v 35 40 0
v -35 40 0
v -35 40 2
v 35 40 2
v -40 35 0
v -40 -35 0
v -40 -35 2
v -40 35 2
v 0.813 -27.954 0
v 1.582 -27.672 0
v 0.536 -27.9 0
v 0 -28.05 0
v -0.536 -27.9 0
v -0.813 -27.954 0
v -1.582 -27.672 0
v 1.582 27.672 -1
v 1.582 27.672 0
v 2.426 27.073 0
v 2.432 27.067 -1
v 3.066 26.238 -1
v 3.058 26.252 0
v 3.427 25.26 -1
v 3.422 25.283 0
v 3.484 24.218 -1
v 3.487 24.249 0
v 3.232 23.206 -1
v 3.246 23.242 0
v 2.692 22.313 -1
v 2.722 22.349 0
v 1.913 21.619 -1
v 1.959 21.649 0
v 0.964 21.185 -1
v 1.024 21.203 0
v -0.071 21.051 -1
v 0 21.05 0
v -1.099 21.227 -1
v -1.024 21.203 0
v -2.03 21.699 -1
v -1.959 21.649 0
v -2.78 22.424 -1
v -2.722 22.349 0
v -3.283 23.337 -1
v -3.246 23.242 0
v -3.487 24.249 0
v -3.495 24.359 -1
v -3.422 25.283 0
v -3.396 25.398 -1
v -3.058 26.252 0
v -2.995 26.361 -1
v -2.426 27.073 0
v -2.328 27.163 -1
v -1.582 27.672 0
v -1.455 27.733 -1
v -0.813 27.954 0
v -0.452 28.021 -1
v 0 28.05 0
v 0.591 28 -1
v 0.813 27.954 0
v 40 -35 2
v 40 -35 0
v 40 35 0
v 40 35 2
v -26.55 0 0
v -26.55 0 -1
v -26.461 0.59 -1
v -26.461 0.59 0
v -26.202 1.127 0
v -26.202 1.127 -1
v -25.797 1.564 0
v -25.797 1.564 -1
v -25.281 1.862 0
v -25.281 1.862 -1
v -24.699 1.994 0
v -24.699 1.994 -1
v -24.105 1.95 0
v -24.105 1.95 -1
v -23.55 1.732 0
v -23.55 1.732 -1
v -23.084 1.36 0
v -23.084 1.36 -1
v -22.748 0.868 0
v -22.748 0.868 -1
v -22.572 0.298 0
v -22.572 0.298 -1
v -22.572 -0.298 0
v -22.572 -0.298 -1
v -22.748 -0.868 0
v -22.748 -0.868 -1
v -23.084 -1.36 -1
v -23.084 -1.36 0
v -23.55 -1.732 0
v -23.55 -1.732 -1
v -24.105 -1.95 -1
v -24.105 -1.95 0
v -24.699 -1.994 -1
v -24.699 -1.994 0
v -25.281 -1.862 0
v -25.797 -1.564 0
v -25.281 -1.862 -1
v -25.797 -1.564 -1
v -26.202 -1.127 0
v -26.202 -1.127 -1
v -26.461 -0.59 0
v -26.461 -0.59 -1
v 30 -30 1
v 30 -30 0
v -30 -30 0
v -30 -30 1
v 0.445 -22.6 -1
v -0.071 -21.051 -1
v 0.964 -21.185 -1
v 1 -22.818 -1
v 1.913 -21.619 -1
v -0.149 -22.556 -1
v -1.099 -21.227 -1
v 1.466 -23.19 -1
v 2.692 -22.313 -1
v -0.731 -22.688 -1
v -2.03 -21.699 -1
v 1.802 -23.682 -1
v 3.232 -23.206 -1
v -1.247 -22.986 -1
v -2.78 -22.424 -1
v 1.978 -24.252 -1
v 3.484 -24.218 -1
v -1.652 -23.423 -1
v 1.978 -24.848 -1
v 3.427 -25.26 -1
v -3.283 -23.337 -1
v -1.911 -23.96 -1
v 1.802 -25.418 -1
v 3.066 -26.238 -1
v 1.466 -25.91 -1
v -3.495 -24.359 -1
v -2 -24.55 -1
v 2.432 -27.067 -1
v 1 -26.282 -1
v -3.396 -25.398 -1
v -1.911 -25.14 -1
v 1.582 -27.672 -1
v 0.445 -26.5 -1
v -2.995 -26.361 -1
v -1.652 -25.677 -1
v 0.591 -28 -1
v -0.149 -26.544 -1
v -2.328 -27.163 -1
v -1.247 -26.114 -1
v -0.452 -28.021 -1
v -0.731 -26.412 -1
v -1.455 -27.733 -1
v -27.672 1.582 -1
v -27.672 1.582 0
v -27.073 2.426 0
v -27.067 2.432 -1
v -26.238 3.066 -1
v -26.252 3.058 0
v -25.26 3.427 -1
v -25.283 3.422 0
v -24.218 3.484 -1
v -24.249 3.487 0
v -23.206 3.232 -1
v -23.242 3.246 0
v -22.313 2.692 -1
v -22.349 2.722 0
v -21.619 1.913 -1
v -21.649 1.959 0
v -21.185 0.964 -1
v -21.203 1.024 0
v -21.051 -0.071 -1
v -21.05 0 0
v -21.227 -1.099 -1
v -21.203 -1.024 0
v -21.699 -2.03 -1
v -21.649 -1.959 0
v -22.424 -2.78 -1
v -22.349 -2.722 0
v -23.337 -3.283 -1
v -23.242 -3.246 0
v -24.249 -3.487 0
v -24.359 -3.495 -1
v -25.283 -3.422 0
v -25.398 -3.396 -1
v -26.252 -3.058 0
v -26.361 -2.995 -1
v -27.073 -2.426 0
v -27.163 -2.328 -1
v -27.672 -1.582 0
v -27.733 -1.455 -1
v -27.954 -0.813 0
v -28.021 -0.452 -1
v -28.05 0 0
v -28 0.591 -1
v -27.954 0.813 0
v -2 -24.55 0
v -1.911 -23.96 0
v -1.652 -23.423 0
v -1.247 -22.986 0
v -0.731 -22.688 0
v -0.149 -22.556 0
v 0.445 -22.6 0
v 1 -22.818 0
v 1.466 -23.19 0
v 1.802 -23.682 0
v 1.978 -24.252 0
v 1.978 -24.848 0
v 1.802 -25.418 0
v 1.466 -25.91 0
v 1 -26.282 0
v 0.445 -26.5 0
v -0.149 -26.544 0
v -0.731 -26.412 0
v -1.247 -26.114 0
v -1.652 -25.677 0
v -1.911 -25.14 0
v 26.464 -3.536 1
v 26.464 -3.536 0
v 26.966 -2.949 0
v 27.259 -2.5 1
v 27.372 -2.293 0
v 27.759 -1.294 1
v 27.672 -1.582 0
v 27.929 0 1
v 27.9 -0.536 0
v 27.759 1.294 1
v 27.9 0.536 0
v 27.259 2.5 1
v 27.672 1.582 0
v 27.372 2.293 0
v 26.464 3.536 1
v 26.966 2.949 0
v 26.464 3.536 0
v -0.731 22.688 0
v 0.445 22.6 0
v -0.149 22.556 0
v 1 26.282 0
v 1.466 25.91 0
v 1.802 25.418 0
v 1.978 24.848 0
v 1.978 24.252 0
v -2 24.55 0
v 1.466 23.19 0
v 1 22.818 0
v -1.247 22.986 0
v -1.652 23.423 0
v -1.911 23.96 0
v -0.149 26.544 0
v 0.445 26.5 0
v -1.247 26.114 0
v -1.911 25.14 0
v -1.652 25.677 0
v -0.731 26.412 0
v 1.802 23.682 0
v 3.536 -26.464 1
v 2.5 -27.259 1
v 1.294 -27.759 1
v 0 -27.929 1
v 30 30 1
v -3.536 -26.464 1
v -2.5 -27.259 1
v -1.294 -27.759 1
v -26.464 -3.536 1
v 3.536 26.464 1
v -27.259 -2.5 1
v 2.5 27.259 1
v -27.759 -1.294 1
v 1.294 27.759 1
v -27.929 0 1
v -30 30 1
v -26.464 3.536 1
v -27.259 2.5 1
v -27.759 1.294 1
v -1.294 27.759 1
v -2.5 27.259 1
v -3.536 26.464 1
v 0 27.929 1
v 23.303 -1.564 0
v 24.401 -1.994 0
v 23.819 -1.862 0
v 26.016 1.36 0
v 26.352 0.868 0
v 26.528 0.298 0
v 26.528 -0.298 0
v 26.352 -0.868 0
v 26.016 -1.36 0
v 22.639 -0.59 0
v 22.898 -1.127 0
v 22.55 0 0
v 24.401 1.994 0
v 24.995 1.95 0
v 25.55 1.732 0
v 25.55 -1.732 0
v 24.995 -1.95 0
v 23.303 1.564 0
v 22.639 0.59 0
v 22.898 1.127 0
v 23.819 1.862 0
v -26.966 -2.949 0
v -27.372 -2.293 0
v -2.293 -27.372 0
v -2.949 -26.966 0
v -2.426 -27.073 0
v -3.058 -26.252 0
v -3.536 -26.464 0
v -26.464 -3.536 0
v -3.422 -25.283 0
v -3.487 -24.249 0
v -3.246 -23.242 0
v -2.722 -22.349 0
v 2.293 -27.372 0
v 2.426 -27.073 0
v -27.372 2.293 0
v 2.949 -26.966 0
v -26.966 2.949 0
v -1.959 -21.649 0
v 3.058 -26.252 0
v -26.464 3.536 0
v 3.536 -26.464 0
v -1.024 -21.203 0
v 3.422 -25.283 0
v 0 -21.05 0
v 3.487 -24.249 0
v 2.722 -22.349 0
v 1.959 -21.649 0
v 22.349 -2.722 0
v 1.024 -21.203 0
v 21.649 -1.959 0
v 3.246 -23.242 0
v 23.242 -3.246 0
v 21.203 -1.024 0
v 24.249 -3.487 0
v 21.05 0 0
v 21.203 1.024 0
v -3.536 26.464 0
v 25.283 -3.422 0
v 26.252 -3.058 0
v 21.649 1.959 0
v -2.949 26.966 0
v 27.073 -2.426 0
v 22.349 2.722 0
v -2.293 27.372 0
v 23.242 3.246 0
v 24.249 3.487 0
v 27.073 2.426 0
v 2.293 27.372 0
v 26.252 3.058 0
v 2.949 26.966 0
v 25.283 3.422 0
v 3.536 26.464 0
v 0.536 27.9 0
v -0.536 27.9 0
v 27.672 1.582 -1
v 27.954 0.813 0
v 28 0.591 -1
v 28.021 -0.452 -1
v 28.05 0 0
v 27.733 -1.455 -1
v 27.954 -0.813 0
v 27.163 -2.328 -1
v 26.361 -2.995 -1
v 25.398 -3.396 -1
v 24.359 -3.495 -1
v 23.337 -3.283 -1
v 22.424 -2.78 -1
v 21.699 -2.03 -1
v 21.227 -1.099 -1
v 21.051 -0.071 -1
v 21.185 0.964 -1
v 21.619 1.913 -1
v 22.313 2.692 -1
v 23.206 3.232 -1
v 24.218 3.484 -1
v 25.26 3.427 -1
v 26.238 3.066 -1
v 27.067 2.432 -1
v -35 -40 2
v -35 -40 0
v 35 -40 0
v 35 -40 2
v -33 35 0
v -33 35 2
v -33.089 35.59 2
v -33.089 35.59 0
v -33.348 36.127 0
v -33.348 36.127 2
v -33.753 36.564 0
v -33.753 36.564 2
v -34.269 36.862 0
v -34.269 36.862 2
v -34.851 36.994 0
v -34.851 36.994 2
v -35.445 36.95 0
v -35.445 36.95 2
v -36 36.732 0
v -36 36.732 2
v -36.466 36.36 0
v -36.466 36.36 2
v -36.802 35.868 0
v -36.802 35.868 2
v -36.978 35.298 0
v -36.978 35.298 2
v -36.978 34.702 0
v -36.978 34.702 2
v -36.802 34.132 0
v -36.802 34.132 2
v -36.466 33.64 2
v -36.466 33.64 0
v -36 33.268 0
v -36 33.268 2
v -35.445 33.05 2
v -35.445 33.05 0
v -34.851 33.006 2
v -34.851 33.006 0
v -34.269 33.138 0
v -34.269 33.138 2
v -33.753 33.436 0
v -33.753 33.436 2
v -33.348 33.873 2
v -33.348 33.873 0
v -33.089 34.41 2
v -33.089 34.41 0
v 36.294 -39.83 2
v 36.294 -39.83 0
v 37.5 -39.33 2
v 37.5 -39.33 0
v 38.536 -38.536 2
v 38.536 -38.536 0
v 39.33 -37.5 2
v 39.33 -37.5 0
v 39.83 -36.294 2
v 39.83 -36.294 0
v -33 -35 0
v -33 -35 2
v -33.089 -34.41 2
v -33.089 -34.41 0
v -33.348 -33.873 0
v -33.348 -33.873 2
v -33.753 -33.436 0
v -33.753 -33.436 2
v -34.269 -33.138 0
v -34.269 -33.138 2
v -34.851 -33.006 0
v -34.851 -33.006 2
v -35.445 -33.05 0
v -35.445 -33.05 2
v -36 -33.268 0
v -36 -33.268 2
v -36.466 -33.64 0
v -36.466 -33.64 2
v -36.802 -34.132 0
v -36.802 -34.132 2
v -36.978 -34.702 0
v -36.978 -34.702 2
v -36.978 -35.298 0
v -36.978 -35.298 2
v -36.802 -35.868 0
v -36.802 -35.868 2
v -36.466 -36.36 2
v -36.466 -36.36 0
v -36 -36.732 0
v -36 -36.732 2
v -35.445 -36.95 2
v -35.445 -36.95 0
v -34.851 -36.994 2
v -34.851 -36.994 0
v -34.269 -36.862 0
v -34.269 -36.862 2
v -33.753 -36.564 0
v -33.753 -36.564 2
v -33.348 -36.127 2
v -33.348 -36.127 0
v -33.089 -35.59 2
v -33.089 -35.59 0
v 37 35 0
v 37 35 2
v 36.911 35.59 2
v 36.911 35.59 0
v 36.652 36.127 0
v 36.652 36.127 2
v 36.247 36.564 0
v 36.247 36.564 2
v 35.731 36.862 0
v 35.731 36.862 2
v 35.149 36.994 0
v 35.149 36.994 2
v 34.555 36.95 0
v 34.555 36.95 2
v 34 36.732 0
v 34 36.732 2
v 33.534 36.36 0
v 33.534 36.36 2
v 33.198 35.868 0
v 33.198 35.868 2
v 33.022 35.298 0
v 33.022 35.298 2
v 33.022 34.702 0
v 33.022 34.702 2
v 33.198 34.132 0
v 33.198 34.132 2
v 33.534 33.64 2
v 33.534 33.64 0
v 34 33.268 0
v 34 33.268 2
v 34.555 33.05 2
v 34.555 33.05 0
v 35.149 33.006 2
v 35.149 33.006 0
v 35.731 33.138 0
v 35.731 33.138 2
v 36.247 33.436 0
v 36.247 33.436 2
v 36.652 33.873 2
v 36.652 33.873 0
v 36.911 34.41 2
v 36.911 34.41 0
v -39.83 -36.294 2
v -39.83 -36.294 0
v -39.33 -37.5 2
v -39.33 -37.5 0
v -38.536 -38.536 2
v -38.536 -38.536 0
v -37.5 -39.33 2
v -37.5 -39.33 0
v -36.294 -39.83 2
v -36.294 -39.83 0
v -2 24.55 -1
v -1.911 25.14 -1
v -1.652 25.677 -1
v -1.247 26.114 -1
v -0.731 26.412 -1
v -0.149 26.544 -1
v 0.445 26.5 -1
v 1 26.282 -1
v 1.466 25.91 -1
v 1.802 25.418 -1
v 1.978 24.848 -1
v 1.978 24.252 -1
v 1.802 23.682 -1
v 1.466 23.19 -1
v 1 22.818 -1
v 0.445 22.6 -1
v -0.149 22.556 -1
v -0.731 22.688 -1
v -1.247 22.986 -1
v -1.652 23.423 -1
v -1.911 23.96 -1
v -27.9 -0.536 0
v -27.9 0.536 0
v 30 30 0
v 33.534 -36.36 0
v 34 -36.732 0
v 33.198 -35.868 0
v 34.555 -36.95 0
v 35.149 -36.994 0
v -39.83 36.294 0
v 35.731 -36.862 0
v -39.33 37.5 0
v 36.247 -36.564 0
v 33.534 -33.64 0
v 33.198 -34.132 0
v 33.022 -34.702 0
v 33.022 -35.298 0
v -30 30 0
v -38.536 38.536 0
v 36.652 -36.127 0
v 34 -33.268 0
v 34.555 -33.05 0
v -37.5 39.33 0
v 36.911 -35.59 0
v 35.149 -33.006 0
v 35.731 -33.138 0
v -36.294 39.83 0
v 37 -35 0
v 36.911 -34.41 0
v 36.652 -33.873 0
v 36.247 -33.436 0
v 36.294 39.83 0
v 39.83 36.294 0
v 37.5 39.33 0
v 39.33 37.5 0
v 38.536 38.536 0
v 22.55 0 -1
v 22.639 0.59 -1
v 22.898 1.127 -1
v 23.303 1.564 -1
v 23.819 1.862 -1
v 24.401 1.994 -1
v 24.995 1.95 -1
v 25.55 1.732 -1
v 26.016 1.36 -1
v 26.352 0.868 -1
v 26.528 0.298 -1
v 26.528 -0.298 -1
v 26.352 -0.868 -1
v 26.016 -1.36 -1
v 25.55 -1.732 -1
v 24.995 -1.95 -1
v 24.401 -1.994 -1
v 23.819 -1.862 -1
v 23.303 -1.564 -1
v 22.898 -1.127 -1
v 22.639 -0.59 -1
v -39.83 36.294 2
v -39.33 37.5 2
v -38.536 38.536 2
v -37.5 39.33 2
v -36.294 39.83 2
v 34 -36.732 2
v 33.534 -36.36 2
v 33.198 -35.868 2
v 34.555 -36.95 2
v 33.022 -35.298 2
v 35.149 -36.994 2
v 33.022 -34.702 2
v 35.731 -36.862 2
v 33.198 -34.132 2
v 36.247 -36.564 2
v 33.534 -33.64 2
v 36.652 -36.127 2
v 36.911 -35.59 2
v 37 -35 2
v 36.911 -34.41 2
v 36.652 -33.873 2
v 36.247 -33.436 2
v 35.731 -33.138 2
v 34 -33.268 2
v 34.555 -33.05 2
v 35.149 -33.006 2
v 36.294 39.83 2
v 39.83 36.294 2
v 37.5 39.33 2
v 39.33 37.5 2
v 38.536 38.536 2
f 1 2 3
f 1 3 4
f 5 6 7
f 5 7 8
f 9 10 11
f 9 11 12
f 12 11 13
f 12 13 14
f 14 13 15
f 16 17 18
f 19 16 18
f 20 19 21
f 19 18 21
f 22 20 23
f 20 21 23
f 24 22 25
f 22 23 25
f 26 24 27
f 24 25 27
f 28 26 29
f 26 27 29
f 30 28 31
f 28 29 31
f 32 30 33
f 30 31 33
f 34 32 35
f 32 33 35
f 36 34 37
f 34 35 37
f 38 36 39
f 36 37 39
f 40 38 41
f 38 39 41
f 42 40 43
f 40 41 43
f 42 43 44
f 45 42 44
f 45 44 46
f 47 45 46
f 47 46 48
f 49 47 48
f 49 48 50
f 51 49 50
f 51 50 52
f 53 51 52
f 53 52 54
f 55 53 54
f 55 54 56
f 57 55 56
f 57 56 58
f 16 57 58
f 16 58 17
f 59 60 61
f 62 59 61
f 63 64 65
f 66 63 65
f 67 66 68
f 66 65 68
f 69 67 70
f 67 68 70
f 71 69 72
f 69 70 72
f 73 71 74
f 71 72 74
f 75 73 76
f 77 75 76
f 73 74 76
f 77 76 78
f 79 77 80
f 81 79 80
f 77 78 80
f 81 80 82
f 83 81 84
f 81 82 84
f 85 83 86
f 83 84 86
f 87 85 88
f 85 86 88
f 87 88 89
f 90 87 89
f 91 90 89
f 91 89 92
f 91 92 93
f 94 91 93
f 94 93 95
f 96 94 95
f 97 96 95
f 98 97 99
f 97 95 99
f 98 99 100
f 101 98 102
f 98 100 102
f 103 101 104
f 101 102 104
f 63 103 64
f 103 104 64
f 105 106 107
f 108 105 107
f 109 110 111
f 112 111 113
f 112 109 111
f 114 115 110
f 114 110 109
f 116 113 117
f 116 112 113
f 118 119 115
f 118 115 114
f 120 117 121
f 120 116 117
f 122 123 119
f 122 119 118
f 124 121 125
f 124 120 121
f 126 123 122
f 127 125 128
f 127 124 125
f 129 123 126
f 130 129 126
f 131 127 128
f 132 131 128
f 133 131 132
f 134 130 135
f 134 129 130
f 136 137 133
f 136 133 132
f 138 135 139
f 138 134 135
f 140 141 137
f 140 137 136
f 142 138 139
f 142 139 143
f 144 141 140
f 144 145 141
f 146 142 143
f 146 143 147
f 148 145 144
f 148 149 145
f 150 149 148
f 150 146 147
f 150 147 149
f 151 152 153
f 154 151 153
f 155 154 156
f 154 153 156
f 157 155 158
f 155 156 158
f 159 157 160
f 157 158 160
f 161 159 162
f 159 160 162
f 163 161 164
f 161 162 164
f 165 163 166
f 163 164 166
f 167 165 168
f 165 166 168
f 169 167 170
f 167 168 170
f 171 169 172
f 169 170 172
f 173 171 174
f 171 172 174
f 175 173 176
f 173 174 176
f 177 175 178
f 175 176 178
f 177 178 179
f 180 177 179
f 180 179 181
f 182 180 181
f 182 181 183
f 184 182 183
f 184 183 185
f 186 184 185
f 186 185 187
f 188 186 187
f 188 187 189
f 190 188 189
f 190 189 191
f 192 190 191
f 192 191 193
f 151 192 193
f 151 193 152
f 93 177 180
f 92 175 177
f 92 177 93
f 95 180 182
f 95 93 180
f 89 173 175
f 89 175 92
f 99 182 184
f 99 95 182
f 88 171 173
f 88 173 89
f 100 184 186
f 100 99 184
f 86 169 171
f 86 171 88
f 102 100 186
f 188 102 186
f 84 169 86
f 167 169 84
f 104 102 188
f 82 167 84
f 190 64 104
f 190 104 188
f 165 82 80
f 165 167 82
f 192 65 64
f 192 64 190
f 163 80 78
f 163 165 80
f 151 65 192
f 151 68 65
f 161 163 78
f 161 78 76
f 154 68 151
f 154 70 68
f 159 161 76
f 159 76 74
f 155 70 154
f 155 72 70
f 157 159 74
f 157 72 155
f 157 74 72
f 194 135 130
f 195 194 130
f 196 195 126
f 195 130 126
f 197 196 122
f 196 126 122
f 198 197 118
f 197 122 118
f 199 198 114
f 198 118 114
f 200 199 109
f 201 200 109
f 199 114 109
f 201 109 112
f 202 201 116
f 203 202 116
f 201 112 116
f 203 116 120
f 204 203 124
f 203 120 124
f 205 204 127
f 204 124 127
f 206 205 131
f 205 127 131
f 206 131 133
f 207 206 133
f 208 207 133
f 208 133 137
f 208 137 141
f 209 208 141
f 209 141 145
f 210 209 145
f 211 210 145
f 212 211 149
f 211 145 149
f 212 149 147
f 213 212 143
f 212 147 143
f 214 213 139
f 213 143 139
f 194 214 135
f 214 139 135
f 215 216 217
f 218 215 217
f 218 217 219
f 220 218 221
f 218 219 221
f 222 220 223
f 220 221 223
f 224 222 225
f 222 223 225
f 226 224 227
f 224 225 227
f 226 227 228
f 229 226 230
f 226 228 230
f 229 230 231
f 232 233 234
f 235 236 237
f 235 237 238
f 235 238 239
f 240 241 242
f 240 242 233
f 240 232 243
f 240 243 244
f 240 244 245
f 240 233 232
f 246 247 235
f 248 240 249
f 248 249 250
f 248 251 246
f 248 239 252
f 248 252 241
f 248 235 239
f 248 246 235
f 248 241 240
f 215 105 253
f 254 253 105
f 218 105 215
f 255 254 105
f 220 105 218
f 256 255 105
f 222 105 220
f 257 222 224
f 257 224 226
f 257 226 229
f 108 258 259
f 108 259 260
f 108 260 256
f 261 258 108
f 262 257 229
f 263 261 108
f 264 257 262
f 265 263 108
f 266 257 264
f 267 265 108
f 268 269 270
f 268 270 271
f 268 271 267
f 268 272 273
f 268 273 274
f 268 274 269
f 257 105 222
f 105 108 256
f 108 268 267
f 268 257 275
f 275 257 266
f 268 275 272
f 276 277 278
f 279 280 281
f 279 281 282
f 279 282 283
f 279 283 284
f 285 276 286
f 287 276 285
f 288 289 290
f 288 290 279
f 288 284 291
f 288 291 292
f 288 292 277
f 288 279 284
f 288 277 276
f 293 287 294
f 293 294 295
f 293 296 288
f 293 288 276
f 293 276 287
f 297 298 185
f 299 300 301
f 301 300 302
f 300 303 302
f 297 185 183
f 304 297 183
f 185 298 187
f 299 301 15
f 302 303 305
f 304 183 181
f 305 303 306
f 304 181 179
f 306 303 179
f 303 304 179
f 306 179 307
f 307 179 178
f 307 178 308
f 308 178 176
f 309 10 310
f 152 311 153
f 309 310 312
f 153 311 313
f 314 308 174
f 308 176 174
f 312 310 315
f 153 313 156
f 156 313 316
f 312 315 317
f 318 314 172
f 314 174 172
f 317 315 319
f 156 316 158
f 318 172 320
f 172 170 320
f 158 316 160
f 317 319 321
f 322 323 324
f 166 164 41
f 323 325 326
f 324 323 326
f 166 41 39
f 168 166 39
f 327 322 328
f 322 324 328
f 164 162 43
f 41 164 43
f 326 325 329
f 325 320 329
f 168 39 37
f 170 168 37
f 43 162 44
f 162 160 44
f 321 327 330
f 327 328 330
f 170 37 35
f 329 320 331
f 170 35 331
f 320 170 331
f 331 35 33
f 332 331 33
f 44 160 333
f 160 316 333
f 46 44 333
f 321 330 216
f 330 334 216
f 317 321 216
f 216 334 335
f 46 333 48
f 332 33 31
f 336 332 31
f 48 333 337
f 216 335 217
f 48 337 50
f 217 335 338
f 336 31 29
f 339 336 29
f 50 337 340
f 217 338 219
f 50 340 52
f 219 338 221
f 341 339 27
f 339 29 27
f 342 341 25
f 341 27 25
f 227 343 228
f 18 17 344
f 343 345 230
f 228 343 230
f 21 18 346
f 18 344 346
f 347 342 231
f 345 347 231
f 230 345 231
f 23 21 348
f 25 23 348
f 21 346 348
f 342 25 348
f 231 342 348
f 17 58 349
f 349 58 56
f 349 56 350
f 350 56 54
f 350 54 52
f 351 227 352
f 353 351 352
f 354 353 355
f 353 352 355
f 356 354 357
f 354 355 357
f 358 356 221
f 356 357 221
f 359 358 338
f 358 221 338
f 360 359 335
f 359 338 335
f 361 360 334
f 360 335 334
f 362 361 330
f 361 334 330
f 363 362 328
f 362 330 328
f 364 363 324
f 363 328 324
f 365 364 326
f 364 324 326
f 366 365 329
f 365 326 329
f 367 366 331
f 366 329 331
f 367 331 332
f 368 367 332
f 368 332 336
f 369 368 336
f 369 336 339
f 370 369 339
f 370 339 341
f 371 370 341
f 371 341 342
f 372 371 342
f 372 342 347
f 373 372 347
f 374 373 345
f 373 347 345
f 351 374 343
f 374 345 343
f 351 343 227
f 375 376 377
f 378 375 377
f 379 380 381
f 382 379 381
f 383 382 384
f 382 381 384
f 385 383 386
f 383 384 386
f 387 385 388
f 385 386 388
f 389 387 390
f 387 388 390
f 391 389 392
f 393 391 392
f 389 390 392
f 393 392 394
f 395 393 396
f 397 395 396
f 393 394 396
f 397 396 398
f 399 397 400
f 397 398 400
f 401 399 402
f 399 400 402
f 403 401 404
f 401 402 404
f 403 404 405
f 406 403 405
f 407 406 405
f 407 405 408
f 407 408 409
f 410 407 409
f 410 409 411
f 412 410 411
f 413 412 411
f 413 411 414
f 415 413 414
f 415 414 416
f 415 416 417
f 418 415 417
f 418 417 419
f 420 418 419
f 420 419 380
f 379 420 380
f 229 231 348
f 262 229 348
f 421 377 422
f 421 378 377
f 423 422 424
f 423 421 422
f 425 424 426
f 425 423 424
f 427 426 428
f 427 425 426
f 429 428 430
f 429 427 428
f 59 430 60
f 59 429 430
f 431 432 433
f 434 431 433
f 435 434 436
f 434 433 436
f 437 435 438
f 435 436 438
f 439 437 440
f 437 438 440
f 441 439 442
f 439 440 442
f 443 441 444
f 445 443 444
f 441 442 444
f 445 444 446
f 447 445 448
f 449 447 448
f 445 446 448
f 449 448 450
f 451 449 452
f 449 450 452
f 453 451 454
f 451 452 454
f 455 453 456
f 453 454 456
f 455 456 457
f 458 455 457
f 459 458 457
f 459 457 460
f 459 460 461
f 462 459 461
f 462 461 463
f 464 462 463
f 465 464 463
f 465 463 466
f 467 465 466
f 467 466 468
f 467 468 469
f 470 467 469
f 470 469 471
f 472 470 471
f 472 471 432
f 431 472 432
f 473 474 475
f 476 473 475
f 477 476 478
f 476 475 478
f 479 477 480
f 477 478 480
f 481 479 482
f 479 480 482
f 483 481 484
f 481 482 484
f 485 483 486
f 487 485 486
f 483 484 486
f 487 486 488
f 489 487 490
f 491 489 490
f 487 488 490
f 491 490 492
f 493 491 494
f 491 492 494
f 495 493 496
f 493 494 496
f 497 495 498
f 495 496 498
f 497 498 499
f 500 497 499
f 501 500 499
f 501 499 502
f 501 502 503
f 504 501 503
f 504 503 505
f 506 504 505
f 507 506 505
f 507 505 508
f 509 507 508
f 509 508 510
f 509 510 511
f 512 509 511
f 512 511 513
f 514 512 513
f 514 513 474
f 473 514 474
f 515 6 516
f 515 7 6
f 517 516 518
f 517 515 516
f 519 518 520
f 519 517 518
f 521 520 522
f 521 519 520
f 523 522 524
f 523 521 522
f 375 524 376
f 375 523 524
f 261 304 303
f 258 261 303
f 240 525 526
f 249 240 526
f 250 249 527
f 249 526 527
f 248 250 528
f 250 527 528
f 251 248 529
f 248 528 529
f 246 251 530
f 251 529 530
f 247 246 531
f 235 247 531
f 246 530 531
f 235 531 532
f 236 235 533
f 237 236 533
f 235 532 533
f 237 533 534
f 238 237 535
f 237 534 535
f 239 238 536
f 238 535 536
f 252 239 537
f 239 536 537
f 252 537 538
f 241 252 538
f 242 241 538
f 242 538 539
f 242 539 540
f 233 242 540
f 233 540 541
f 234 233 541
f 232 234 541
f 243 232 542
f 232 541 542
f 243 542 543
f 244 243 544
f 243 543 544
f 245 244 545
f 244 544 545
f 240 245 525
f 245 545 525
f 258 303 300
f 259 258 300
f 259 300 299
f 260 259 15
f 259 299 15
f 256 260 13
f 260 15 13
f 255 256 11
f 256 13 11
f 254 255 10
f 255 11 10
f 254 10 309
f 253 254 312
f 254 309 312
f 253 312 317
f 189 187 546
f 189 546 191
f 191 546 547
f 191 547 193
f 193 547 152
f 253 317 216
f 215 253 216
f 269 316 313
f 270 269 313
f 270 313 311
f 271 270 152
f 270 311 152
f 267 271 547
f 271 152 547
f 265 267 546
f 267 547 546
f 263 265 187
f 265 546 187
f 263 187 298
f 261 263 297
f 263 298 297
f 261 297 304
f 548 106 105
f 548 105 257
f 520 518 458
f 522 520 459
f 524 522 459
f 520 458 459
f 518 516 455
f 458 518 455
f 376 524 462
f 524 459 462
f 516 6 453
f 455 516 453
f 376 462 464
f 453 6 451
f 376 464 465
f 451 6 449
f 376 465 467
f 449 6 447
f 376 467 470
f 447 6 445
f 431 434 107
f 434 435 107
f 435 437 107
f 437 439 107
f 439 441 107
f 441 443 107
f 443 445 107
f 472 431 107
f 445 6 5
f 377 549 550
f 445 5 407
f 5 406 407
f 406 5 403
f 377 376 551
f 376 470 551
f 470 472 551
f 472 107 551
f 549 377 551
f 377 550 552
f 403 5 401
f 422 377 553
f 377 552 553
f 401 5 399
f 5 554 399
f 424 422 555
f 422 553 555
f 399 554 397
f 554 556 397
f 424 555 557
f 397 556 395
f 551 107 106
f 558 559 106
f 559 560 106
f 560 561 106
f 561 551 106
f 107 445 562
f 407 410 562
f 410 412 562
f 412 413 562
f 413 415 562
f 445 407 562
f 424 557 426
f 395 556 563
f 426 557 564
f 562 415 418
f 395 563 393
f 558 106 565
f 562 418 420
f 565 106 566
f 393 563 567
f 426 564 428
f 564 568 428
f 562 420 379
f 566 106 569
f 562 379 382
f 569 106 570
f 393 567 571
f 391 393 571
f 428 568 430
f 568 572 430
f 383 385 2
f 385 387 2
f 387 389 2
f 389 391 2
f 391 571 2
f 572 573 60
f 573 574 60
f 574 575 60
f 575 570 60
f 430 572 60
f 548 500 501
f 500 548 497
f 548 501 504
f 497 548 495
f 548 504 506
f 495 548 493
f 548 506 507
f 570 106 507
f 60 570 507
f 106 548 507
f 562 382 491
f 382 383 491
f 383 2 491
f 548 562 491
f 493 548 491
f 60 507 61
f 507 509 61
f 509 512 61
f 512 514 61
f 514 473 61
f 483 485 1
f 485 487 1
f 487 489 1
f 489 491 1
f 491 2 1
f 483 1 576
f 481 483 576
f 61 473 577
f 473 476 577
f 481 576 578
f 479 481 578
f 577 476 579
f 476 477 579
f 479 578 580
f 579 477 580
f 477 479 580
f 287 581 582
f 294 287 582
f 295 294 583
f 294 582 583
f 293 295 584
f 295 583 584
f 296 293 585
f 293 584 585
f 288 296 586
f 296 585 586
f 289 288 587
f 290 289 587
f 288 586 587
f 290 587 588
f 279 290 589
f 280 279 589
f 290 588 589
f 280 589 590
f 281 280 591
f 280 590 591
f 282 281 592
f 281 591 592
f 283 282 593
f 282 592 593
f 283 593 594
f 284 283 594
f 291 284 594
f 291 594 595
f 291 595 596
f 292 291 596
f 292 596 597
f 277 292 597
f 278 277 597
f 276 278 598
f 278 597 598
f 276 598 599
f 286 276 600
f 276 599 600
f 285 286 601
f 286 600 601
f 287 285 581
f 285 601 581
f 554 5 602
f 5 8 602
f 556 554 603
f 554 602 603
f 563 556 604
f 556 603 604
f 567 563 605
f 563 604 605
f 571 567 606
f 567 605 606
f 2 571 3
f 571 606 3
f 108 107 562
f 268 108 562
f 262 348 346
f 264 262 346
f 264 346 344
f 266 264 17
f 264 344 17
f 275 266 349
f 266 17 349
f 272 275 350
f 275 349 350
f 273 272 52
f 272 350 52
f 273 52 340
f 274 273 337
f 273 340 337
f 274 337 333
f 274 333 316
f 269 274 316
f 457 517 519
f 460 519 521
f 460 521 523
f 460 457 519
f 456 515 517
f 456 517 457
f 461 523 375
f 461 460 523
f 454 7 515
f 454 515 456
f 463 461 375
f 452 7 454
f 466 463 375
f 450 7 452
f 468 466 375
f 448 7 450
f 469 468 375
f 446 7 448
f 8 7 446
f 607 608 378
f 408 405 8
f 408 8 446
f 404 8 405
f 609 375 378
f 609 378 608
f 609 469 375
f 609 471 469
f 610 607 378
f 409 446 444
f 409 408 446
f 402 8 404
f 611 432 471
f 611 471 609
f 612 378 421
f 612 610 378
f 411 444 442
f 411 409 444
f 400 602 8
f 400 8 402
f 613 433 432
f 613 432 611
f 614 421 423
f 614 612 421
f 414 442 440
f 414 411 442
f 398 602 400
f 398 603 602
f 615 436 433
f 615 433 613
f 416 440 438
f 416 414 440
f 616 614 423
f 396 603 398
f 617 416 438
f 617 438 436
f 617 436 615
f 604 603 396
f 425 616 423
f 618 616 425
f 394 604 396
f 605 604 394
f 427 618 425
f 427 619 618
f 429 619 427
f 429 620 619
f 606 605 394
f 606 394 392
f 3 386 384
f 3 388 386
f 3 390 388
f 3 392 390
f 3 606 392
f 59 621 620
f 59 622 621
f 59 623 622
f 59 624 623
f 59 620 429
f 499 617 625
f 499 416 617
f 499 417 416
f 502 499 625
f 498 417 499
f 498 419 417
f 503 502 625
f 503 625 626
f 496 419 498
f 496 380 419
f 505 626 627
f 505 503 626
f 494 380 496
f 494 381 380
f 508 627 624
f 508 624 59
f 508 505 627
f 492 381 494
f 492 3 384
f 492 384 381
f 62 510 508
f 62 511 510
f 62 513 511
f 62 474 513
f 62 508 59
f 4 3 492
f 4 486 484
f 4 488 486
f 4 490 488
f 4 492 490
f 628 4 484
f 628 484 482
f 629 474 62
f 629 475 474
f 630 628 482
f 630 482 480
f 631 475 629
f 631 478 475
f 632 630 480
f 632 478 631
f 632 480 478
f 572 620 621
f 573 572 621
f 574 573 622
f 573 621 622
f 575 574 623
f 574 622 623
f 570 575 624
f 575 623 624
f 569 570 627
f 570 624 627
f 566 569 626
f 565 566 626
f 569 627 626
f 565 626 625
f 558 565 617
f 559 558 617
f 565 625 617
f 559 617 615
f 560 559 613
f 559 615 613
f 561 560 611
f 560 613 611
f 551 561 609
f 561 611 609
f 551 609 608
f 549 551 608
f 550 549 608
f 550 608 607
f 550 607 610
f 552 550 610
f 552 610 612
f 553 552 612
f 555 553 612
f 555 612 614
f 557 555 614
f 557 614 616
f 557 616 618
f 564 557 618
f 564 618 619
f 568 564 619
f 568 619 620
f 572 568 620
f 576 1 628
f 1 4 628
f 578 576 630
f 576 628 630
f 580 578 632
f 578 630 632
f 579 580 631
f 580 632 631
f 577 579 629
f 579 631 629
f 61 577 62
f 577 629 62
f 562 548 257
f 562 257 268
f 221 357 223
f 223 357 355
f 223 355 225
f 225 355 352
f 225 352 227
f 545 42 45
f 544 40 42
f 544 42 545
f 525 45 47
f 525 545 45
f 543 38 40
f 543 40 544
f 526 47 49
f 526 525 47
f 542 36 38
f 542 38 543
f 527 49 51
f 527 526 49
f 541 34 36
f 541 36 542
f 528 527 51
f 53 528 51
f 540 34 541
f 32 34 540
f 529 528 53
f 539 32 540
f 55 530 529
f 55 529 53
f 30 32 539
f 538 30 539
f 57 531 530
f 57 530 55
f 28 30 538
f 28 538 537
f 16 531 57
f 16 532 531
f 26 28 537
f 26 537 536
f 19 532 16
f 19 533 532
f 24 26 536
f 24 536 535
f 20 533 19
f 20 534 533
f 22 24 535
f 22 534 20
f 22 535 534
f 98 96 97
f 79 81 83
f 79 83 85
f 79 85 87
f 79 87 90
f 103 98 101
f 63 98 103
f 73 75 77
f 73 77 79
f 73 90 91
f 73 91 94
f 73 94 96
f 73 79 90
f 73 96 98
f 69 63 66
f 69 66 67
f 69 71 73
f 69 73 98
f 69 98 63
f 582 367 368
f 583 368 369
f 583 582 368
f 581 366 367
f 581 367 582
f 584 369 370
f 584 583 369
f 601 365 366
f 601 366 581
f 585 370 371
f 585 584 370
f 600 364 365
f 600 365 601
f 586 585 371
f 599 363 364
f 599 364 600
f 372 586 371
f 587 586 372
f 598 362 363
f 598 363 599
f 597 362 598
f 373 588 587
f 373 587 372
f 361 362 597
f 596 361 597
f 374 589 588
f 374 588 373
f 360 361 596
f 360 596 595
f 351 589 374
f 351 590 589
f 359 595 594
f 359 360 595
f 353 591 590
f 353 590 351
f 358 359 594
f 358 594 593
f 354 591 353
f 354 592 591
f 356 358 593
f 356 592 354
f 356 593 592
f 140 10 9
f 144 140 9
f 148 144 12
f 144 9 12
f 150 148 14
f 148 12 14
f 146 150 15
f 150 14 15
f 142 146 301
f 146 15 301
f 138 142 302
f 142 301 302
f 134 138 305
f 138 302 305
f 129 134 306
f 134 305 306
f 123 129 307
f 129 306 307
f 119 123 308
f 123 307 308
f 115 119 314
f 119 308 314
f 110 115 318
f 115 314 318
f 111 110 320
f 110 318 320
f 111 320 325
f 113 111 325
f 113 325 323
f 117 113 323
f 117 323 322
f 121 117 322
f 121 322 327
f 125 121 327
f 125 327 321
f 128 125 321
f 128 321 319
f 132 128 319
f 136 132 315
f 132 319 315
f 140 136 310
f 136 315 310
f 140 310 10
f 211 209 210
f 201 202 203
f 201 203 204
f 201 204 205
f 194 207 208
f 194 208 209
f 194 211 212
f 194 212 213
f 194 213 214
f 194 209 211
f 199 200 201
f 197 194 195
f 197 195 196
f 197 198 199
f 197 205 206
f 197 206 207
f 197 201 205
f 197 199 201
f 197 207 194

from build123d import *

# Parameters (mm, degrees)
SKETCH1_W           = 80
SKETCH1_H           = 80
BOSS_EXTRUDE1_DEPTH = 2
SKETCH2_R           = 3.5
BOSS_EXTRUDE2_DEPTH = 1
SKETCH3_R           = 2
CUT_EXTRUDE1_DEPTH  = 1
FILLET1_R           = 5
SKETCH4_R           = 2
CUT_EXTRUDE2_DEPTH  = 11
SKETCH5_W           = 60
SKETCH5_H           = 60
CUT_EXTRUDE4_DEPTH  = 1


with BuildPart() as part:
    # Sketch1 → Boss-Extrude1 (new body)
    with BuildSketch(Plane.XY):
        Rectangle(SKETCH1_W, SKETCH1_H)
    extrude(amount=BOSS_EXTRUDE1_DEPTH)

    # Sketch2 → Boss-Extrude2 (add)
    with BuildSketch(Plane(origin=(0, 0, 0), x_dir=(-1, 0, 0), z_dir=(0, 0, -1))):
        with Locations(Location((0, 24.55, 0), (0, 0, 116.872206362))):
            Circle(SKETCH2_R)
        with Locations(Location((24.55, 0, 0), (0, 0, 26.872206362))):
            Circle(SKETCH2_R)
        with Locations(Location((0, -24.55, 0), (0, 0, 243.127793638))):
            Circle(SKETCH2_R)
        with Locations(Location((-24.55, 0, 0), (0, 0, 153.127793638))):
            Circle(SKETCH2_R)
    extrude(amount=BOSS_EXTRUDE2_DEPTH)

    # Sketch3 → Cut-Extrude1 (cut)
    with BuildSketch(Plane(origin=(0, 0, -1), x_dir=(-1, 0, 0), z_dir=(0, 0, -1))):
        with Locations((-24.55, 0)):
            Circle(SKETCH3_R)
        with Locations((0, 24.55)):
            Circle(SKETCH3_R)
        with Locations((0, -24.55)):
            Circle(SKETCH3_R)
        with Locations((24.55, 0)):
            Circle(SKETCH3_R)
    extrude(amount=-CUT_EXTRUDE1_DEPTH, mode=Mode.SUBTRACT)

    # Fillet1
    fillet1_edges = [part.edges().sort_by_distance(p)[0] for p in [
        (-40, 40, 1),
        (40, 40, 1),
        (-40, -40, 1),
        (40, -40, 1),
    ]]
    fillet(fillet1_edges, radius=FILLET1_R)

    # Sketch4 → Cut-Extrude2 (cut)
    with BuildSketch(Plane.XY.offset(2)):
        with Locations((35, 35)):
            Circle(SKETCH4_R)
        with Locations((-35, 35)):
            Circle(SKETCH4_R)
        with Locations((35, -35)):
            Circle(SKETCH4_R)
        with Locations((-35, -35)):
            Circle(SKETCH4_R)
    extrude(amount=-CUT_EXTRUDE2_DEPTH, mode=Mode.SUBTRACT)

    # Sketch5 → Cut-Extrude4 (cut)
    with BuildSketch(Plane(origin=(0, 0, 0), x_dir=(-1, 0, 0), z_dir=(0, 0, -1))):
        Rectangle(SKETCH5_W, SKETCH5_H)
        with BuildLine():
            Line((26.464466094, -3.535533906), (3.535533906, -26.464466094))
            ThreePointArc((3.535533906, -26.464466094), (0, -27.928932188), (-3.535533906, -26.464466094))
            Line((-3.535533906, -26.464466094), (-26.464466094, -3.535533906))
            ThreePointArc((-26.464466094, -3.535533906), (-27.928932188, 0), (-26.464466094, 3.535533906))
            Line((-26.464466094, 3.535533906), (-3.535533906, 26.464466094))
            ThreePointArc((-3.535533906, 26.464466094), (0, 27.928932188), (3.535533906, 26.464466094))
            Line((3.535533906, 26.464466094), (26.464466094, 3.535533906))
            ThreePointArc((26.464466094, 3.535533906), (27.928932188, 0), (26.464466094, -3.535533906))
        make_face(mode=Mode.SUBTRACT)
    extrude(amount=-CUT_EXTRUDE4_DEPTH, mode=Mode.SUBTRACT)


solid = part.part
